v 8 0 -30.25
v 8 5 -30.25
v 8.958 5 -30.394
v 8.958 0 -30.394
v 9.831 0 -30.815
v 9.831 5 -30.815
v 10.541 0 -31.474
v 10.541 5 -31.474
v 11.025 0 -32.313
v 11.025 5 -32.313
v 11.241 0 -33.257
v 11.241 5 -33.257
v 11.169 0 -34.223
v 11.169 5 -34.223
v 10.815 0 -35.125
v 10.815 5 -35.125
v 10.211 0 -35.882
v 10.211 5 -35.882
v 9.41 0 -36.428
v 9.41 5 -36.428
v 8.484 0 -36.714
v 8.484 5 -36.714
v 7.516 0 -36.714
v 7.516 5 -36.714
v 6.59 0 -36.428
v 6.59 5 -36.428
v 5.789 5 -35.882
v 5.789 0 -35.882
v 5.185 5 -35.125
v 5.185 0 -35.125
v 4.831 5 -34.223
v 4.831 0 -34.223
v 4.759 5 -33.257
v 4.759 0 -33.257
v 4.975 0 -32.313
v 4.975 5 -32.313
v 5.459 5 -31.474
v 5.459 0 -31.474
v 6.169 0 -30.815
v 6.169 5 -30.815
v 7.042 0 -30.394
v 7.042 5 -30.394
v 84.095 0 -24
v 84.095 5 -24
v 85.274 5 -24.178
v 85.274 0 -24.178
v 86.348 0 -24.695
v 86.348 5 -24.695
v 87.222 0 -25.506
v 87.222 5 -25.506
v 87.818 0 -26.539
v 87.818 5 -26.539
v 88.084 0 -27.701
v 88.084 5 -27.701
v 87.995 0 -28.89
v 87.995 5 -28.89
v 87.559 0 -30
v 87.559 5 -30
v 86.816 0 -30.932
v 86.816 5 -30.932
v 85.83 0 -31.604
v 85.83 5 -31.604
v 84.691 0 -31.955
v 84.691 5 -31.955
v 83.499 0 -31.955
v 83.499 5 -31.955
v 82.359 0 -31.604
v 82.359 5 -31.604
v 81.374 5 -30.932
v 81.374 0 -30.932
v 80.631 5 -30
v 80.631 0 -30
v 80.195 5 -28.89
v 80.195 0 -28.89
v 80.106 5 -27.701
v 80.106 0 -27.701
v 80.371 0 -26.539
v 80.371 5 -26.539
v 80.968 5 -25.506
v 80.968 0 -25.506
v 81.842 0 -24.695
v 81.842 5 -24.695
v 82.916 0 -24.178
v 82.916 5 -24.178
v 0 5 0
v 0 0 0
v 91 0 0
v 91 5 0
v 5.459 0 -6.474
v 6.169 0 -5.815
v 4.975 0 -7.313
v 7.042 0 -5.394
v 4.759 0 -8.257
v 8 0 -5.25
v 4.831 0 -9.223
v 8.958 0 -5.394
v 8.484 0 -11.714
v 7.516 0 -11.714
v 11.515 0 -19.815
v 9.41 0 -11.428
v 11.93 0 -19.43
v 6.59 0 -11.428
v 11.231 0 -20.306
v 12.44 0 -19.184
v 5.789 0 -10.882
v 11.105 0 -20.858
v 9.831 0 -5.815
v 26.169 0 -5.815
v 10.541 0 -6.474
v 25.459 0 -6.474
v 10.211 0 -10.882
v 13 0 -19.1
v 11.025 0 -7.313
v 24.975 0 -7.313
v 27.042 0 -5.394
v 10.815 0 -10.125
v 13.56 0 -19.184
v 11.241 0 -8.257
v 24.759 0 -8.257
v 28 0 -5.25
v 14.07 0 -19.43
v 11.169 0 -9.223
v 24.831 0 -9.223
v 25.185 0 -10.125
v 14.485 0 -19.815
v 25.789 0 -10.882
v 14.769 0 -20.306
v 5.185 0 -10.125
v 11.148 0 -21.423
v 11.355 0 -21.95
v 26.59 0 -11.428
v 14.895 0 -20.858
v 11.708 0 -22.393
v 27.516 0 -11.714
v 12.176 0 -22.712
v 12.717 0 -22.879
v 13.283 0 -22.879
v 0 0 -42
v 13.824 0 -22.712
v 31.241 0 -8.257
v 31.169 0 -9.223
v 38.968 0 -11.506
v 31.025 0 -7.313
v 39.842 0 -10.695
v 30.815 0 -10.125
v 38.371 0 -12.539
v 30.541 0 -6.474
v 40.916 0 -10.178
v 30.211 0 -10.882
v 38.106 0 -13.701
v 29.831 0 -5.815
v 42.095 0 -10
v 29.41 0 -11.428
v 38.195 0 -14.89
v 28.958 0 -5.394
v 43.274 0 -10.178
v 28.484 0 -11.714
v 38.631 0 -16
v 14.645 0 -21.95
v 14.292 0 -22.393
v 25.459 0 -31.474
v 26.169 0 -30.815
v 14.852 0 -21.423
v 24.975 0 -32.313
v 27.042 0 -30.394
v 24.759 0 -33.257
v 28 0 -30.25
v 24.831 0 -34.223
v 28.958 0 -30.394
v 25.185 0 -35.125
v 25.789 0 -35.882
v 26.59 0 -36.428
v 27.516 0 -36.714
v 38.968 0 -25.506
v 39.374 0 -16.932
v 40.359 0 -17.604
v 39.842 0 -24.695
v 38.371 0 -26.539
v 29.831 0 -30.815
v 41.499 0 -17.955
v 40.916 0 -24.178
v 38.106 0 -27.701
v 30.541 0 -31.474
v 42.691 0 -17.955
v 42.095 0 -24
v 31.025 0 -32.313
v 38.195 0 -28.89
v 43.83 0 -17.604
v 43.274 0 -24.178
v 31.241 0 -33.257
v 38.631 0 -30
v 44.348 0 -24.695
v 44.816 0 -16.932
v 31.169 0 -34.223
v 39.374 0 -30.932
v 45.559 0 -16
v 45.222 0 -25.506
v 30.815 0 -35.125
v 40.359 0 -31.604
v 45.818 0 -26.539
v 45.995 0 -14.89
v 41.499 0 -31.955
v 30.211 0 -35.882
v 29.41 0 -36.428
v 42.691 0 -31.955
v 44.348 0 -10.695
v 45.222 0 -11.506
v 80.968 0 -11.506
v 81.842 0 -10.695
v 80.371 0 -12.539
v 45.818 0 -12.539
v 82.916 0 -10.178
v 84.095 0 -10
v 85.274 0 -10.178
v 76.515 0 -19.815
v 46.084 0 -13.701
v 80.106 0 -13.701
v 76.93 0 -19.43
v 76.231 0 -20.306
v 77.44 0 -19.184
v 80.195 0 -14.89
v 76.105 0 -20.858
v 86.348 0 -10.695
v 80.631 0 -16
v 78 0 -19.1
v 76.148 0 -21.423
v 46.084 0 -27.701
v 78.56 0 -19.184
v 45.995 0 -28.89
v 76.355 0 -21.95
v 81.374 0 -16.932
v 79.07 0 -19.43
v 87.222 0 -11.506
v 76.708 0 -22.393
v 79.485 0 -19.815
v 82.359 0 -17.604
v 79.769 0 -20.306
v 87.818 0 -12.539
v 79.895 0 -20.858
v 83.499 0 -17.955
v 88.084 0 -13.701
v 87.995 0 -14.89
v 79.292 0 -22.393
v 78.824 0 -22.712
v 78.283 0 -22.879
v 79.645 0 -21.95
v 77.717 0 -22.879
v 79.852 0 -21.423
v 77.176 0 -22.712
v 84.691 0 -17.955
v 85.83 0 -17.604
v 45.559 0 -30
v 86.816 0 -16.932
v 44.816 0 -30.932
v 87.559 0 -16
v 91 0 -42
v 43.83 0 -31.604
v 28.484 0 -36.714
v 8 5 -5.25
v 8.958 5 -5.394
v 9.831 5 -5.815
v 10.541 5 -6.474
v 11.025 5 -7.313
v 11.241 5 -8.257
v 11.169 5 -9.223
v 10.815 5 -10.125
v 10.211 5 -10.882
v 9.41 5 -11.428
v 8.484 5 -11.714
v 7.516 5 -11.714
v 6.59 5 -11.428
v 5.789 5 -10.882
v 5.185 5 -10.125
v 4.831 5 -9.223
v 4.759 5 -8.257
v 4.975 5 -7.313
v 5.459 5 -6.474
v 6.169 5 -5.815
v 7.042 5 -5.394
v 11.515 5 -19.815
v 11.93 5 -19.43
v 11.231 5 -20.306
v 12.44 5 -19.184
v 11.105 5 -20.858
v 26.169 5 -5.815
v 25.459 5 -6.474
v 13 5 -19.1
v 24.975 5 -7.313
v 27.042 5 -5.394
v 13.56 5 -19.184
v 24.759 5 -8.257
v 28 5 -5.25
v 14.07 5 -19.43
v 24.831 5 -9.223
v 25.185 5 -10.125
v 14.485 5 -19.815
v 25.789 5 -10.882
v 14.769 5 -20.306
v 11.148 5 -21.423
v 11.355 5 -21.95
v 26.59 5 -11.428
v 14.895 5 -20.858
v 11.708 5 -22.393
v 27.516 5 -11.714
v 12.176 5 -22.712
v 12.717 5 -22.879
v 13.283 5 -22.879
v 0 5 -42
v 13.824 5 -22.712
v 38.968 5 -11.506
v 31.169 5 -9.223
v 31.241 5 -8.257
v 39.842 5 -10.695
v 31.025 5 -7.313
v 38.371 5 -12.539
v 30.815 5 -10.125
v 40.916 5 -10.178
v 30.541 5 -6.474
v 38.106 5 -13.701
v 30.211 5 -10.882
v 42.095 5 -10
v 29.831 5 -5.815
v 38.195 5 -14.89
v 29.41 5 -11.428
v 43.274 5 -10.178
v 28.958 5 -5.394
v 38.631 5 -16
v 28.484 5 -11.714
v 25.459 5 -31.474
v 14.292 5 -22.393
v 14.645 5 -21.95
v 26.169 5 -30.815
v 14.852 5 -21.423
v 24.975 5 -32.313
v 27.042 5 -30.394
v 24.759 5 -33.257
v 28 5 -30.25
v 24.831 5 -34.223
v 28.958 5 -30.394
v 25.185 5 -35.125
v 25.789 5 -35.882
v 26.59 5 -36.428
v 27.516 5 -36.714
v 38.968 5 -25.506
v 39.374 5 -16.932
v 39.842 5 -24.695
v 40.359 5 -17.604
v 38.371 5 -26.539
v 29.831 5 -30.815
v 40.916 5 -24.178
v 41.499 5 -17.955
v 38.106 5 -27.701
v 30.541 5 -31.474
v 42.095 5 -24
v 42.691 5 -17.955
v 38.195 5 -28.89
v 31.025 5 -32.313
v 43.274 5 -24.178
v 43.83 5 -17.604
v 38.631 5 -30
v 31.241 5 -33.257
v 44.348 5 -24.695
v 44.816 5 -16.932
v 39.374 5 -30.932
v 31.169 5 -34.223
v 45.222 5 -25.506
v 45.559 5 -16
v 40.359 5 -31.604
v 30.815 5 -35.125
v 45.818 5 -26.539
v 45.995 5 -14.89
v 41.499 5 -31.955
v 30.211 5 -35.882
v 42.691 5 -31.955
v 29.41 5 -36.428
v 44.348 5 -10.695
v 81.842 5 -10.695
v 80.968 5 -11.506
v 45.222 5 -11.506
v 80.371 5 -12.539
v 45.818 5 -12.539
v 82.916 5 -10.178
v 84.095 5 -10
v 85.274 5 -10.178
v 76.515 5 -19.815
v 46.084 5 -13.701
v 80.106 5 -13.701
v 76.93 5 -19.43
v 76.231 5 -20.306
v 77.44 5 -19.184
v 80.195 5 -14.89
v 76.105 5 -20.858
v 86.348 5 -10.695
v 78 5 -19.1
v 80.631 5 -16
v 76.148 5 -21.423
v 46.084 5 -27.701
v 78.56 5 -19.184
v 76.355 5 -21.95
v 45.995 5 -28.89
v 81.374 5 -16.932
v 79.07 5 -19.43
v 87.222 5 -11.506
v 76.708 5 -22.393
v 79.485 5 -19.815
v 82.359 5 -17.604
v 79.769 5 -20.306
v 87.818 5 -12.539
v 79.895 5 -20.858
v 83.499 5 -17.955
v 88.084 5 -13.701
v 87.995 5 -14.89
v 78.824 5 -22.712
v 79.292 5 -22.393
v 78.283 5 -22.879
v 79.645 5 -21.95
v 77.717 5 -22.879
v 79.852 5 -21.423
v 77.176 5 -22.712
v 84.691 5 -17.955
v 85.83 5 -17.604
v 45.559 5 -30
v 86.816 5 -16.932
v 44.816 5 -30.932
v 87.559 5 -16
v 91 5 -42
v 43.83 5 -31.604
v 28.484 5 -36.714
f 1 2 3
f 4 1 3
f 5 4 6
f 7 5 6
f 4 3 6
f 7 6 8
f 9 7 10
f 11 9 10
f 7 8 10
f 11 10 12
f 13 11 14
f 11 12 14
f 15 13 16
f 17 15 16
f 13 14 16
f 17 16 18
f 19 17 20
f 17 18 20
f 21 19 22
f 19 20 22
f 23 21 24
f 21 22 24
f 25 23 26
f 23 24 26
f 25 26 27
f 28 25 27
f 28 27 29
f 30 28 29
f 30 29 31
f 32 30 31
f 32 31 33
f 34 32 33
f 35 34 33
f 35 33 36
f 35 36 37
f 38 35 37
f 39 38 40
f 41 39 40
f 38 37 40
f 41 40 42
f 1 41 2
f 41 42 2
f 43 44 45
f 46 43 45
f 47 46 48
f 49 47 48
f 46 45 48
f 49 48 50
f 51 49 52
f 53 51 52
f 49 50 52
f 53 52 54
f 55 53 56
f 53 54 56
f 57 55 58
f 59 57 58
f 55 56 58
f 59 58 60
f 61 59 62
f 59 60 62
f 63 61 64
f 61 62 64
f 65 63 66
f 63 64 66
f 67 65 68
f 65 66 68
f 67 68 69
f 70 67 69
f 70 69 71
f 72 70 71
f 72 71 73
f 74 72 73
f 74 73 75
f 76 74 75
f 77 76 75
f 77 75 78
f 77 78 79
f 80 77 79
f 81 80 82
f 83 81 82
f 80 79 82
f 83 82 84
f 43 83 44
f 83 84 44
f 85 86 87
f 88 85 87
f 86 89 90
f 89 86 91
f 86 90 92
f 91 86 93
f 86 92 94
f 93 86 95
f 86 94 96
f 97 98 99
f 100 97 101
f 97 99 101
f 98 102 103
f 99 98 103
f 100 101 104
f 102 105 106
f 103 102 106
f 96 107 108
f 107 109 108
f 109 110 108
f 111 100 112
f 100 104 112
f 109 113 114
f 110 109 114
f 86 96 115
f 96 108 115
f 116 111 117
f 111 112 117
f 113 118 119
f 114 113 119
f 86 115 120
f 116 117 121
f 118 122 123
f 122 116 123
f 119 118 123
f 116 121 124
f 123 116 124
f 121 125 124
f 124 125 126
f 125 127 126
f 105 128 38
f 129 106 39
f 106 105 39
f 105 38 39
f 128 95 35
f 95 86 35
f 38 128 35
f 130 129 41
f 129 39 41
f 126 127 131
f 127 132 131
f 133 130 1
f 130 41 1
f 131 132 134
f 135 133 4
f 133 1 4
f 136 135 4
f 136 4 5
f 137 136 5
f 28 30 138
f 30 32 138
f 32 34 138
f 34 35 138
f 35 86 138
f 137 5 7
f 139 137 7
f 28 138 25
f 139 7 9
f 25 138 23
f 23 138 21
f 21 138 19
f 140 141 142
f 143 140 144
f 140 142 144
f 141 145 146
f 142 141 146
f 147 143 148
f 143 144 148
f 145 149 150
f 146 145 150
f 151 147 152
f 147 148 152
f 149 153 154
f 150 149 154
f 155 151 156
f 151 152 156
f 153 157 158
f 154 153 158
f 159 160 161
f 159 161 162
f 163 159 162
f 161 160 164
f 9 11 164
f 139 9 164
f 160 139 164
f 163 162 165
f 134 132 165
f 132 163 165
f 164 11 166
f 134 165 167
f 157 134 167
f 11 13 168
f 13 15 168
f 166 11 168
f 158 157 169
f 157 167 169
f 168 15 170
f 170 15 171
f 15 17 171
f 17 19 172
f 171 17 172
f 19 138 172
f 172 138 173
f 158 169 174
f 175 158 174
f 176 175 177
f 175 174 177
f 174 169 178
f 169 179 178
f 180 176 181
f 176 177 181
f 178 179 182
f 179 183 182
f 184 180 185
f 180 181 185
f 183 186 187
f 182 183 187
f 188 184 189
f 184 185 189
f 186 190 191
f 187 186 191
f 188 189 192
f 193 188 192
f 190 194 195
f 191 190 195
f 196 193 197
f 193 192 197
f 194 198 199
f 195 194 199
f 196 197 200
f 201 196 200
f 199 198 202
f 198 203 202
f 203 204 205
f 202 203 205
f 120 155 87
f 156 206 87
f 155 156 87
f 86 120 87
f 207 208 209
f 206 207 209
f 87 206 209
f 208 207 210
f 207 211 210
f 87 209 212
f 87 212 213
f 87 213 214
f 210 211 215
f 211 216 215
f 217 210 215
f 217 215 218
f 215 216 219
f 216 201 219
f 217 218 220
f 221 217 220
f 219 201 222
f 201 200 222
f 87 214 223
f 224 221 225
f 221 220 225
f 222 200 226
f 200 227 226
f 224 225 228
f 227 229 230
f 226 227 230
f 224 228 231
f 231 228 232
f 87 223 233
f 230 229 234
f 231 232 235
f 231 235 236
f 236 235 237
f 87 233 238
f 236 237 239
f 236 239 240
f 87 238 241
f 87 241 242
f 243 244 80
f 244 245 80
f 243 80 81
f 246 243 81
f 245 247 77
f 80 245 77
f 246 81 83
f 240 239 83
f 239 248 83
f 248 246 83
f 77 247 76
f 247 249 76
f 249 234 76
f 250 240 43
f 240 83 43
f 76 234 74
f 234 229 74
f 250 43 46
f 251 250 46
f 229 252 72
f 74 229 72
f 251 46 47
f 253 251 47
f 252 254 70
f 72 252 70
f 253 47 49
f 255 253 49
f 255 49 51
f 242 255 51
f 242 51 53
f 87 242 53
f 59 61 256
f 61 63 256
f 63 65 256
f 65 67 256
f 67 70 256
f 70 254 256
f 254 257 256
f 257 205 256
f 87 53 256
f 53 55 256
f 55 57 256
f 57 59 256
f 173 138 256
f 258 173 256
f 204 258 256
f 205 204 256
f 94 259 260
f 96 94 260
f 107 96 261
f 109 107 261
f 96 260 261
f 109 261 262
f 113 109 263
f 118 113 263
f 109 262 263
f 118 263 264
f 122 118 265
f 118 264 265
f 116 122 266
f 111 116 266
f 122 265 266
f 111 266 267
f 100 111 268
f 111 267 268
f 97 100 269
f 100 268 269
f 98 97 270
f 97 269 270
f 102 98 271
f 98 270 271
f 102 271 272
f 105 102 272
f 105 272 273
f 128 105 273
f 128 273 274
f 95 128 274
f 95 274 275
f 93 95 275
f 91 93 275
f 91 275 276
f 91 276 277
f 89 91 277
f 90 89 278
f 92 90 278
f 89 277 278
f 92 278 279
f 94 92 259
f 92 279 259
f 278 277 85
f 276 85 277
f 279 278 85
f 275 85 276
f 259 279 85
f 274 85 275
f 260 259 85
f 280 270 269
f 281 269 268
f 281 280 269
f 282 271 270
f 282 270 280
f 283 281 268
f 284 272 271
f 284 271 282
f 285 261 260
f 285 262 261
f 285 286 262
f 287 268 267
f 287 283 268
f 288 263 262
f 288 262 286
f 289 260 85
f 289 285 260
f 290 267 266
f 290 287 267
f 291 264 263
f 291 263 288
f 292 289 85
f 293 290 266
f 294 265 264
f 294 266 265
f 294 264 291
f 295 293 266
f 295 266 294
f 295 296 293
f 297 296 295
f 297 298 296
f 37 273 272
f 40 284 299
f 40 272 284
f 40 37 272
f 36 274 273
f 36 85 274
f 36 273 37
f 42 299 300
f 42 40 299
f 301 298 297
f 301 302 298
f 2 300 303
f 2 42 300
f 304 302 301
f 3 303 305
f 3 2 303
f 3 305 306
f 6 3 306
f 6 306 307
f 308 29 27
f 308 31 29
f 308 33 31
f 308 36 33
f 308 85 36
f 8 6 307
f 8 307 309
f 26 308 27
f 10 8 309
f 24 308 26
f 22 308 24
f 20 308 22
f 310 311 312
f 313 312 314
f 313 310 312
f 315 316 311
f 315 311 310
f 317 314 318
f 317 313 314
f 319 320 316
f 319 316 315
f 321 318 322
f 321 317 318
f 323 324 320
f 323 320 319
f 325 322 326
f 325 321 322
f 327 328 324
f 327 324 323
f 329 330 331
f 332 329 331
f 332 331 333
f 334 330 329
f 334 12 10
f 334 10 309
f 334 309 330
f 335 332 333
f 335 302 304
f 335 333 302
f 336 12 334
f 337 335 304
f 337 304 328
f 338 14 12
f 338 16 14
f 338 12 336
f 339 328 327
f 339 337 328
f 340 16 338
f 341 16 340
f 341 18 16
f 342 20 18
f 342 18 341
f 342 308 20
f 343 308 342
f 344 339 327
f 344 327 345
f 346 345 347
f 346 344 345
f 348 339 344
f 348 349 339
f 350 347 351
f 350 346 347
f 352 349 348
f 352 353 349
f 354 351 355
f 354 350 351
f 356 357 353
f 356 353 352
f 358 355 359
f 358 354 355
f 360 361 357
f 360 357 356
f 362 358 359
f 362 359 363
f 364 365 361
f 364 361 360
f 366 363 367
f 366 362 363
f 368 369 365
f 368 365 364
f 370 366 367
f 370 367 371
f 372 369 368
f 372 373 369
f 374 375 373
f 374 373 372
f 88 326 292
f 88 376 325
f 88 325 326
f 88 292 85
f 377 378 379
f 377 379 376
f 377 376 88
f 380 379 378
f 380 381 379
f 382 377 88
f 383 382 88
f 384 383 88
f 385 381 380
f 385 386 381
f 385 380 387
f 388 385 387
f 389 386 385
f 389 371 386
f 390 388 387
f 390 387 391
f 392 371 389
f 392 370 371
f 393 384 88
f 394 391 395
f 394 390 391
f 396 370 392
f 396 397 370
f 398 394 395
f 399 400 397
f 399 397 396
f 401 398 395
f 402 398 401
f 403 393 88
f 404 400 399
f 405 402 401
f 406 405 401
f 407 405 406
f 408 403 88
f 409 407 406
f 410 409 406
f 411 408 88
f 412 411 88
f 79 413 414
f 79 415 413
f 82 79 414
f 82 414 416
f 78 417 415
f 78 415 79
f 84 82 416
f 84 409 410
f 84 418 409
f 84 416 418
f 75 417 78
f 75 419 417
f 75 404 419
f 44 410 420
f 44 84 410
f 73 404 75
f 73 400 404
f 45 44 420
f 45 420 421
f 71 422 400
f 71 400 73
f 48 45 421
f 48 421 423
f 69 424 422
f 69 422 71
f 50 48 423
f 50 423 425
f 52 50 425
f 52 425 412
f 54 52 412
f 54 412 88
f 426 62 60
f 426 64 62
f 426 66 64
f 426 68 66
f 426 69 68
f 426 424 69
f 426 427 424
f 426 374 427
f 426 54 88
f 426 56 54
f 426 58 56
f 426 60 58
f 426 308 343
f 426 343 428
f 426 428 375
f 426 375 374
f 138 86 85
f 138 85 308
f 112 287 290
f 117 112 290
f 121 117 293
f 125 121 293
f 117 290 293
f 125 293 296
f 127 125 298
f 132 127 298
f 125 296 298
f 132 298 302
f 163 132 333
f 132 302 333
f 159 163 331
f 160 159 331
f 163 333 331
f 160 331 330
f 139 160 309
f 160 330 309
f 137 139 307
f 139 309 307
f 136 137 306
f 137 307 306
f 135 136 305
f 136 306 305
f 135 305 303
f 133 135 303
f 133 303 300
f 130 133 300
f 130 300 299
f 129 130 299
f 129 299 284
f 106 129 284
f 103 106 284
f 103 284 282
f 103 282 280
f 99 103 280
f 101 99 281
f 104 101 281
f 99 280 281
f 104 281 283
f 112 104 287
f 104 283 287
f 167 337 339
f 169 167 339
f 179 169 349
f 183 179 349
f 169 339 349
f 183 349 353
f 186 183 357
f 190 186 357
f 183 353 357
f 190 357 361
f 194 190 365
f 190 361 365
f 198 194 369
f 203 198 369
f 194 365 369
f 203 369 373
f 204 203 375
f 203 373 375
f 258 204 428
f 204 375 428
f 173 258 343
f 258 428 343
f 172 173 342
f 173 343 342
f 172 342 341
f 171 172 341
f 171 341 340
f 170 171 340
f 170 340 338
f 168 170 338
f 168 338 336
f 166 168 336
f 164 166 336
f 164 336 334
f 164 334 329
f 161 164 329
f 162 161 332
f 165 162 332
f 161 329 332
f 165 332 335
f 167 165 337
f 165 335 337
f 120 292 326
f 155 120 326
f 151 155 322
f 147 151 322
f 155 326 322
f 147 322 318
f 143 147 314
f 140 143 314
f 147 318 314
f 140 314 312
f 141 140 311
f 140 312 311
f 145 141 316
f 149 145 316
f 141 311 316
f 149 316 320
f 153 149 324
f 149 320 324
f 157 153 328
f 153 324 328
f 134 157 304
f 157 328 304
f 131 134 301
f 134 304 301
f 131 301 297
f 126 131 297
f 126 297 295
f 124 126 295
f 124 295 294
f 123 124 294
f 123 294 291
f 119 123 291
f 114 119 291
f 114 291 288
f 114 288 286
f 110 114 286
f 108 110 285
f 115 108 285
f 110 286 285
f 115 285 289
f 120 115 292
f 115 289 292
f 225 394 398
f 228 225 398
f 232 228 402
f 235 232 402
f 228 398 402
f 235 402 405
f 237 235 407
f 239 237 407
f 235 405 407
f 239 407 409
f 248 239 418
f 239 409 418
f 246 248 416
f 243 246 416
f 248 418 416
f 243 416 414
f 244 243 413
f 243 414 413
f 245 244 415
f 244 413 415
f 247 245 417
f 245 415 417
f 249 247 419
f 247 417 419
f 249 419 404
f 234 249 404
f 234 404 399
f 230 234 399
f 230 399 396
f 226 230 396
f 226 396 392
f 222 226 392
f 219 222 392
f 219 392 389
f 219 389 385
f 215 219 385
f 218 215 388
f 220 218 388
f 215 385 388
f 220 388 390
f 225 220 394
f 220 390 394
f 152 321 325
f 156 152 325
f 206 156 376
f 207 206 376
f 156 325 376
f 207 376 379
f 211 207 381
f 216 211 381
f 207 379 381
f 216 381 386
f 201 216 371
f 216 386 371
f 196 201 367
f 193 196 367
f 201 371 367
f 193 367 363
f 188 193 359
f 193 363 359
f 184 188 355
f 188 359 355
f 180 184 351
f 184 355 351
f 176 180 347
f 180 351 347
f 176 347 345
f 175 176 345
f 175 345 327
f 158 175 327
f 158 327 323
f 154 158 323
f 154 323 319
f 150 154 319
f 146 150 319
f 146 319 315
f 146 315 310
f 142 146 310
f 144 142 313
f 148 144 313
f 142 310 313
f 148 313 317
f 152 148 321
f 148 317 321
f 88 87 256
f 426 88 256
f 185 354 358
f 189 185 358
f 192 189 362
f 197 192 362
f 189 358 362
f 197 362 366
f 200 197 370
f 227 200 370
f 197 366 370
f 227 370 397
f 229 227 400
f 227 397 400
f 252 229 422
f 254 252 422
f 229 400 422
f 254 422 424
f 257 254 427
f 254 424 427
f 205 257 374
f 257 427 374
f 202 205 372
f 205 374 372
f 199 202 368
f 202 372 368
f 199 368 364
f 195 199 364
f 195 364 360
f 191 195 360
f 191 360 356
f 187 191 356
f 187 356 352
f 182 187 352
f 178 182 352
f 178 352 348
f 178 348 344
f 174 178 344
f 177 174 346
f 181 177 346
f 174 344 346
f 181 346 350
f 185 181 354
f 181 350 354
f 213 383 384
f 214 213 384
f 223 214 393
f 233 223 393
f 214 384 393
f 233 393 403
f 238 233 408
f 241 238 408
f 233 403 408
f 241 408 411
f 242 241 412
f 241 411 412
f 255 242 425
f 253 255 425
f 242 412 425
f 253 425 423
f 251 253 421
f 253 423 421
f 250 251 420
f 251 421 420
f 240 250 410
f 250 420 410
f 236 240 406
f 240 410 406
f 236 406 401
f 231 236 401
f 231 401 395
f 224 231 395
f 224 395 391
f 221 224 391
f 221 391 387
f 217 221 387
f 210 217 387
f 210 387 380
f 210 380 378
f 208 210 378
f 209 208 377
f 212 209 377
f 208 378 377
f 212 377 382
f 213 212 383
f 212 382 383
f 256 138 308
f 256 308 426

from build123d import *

# Parameters (mm, degrees)
SKETCH_1_W          = 91
SKETCH_1_H          = 42
EXTRUDE_1_DEPTH     = 5
SKETCH_2_R          = 1.75
SKETCH_2_R_2        = 2.25
SKETCH_2_R_3        = 1.9
CUT_EXTRUDE_1_DEPTH = 5
SKETCH_3_R          = 4
SKETCH_3_R_2        = 3.25
CUT_EXTRUDE_2_DEPTH = 5


with BuildPart() as part:
    # 스케치1 → 보스-돌출1 (new body)
    with BuildSketch(Plane(origin=(0, 0, 0), x_dir=(1, 0, 0), z_dir=(0, 1, 0))):
        with Locations((45.5, 21)):
            Rectangle(SKETCH_1_W, SKETCH_1_H)
    extrude(amount=EXTRUDE_1_DEPTH)

    # 스케치2 → 컷-돌출1 (cut)
    with BuildSketch(Plane(origin=(0, 5, 0), x_dir=(1, 0, 0), z_dir=(0, 1, 0))):
        with Locations(Location((28, 33.5, 0), (0, 0, 270))):
            Circle(SKETCH_2_R)
        with Locations(Location((28, 8.5, 0), (0, 0, 270))):
            Circle(SKETCH_2_R)
        with Locations(Location((8, 8.5, 0), (0, 0, 270))):
            Circle(SKETCH_2_R)
        with Locations(Location((8, 33.5, 0), (0, 0, 270))):
            Circle(SKETCH_2_R)
        with Locations(Location((42.094873015, 28, 0), (0, 0, 270))):
            Circle(SKETCH_2_R_2)
        with Locations(Location((42.094873015, 14, 0), (0, 0, 270))):
            Circle(SKETCH_2_R_2)
        with Locations(Location((84.094873015, 14, 0), (0, 0, 270))):
            Circle(SKETCH_2_R_2)
        with Locations(Location((84.094873015, 28, 0), (0, 0, 270))):
            Circle(SKETCH_2_R_2)
        with Locations(Location((78, 21, 0), (0, 0, 270))):
            Circle(SKETCH_2_R_3)
        with Locations(Location((13, 21, 0), (0, 0, 270))):
            Circle(SKETCH_2_R_3)
    extrude(amount=-CUT_EXTRUDE_1_DEPTH, mode=Mode.SUBTRACT)

    # 스케치3 → 컷-돌출2 (cut)
    with BuildSketch(Plane(origin=(0, 5, 0), x_dir=(1, 0, 0), z_dir=(0, 1, 0))):
        with Locations(Location((84.094873015, 28, 0), (0, 0, 270))):
            Circle(SKETCH_3_R)
        with Locations(Location((84.094873015, 14, 0), (0, 0, 270))):
            Circle(SKETCH_3_R)
        with Locations(Location((42.094873015, 14, 0), (0, 0, 270))):
            Circle(SKETCH_3_R)
        with Locations(Location((42.094873015, 28, 0), (0, 0, 270))):
            Circle(SKETCH_3_R)
        with Locations(Location((28, 33.5, 0), (0, 0, 270))):
            Circle(SKETCH_3_R_2)
        with Locations(Location((28, 8.5, 0), (0, 0, 270))):
            Circle(SKETCH_3_R_2)
        with Locations(Location((8, 8.5, 0), (0, 0, 270))):
            Circle(SKETCH_3_R_2)
        with Locations(Location((8, 33.5, 0), (0, 0, 270))):
            Circle(SKETCH_3_R_2)
    extrude(amount=-CUT_EXTRUDE_2_DEPTH, mode=Mode.SUBTRACT)


solid = part.part
